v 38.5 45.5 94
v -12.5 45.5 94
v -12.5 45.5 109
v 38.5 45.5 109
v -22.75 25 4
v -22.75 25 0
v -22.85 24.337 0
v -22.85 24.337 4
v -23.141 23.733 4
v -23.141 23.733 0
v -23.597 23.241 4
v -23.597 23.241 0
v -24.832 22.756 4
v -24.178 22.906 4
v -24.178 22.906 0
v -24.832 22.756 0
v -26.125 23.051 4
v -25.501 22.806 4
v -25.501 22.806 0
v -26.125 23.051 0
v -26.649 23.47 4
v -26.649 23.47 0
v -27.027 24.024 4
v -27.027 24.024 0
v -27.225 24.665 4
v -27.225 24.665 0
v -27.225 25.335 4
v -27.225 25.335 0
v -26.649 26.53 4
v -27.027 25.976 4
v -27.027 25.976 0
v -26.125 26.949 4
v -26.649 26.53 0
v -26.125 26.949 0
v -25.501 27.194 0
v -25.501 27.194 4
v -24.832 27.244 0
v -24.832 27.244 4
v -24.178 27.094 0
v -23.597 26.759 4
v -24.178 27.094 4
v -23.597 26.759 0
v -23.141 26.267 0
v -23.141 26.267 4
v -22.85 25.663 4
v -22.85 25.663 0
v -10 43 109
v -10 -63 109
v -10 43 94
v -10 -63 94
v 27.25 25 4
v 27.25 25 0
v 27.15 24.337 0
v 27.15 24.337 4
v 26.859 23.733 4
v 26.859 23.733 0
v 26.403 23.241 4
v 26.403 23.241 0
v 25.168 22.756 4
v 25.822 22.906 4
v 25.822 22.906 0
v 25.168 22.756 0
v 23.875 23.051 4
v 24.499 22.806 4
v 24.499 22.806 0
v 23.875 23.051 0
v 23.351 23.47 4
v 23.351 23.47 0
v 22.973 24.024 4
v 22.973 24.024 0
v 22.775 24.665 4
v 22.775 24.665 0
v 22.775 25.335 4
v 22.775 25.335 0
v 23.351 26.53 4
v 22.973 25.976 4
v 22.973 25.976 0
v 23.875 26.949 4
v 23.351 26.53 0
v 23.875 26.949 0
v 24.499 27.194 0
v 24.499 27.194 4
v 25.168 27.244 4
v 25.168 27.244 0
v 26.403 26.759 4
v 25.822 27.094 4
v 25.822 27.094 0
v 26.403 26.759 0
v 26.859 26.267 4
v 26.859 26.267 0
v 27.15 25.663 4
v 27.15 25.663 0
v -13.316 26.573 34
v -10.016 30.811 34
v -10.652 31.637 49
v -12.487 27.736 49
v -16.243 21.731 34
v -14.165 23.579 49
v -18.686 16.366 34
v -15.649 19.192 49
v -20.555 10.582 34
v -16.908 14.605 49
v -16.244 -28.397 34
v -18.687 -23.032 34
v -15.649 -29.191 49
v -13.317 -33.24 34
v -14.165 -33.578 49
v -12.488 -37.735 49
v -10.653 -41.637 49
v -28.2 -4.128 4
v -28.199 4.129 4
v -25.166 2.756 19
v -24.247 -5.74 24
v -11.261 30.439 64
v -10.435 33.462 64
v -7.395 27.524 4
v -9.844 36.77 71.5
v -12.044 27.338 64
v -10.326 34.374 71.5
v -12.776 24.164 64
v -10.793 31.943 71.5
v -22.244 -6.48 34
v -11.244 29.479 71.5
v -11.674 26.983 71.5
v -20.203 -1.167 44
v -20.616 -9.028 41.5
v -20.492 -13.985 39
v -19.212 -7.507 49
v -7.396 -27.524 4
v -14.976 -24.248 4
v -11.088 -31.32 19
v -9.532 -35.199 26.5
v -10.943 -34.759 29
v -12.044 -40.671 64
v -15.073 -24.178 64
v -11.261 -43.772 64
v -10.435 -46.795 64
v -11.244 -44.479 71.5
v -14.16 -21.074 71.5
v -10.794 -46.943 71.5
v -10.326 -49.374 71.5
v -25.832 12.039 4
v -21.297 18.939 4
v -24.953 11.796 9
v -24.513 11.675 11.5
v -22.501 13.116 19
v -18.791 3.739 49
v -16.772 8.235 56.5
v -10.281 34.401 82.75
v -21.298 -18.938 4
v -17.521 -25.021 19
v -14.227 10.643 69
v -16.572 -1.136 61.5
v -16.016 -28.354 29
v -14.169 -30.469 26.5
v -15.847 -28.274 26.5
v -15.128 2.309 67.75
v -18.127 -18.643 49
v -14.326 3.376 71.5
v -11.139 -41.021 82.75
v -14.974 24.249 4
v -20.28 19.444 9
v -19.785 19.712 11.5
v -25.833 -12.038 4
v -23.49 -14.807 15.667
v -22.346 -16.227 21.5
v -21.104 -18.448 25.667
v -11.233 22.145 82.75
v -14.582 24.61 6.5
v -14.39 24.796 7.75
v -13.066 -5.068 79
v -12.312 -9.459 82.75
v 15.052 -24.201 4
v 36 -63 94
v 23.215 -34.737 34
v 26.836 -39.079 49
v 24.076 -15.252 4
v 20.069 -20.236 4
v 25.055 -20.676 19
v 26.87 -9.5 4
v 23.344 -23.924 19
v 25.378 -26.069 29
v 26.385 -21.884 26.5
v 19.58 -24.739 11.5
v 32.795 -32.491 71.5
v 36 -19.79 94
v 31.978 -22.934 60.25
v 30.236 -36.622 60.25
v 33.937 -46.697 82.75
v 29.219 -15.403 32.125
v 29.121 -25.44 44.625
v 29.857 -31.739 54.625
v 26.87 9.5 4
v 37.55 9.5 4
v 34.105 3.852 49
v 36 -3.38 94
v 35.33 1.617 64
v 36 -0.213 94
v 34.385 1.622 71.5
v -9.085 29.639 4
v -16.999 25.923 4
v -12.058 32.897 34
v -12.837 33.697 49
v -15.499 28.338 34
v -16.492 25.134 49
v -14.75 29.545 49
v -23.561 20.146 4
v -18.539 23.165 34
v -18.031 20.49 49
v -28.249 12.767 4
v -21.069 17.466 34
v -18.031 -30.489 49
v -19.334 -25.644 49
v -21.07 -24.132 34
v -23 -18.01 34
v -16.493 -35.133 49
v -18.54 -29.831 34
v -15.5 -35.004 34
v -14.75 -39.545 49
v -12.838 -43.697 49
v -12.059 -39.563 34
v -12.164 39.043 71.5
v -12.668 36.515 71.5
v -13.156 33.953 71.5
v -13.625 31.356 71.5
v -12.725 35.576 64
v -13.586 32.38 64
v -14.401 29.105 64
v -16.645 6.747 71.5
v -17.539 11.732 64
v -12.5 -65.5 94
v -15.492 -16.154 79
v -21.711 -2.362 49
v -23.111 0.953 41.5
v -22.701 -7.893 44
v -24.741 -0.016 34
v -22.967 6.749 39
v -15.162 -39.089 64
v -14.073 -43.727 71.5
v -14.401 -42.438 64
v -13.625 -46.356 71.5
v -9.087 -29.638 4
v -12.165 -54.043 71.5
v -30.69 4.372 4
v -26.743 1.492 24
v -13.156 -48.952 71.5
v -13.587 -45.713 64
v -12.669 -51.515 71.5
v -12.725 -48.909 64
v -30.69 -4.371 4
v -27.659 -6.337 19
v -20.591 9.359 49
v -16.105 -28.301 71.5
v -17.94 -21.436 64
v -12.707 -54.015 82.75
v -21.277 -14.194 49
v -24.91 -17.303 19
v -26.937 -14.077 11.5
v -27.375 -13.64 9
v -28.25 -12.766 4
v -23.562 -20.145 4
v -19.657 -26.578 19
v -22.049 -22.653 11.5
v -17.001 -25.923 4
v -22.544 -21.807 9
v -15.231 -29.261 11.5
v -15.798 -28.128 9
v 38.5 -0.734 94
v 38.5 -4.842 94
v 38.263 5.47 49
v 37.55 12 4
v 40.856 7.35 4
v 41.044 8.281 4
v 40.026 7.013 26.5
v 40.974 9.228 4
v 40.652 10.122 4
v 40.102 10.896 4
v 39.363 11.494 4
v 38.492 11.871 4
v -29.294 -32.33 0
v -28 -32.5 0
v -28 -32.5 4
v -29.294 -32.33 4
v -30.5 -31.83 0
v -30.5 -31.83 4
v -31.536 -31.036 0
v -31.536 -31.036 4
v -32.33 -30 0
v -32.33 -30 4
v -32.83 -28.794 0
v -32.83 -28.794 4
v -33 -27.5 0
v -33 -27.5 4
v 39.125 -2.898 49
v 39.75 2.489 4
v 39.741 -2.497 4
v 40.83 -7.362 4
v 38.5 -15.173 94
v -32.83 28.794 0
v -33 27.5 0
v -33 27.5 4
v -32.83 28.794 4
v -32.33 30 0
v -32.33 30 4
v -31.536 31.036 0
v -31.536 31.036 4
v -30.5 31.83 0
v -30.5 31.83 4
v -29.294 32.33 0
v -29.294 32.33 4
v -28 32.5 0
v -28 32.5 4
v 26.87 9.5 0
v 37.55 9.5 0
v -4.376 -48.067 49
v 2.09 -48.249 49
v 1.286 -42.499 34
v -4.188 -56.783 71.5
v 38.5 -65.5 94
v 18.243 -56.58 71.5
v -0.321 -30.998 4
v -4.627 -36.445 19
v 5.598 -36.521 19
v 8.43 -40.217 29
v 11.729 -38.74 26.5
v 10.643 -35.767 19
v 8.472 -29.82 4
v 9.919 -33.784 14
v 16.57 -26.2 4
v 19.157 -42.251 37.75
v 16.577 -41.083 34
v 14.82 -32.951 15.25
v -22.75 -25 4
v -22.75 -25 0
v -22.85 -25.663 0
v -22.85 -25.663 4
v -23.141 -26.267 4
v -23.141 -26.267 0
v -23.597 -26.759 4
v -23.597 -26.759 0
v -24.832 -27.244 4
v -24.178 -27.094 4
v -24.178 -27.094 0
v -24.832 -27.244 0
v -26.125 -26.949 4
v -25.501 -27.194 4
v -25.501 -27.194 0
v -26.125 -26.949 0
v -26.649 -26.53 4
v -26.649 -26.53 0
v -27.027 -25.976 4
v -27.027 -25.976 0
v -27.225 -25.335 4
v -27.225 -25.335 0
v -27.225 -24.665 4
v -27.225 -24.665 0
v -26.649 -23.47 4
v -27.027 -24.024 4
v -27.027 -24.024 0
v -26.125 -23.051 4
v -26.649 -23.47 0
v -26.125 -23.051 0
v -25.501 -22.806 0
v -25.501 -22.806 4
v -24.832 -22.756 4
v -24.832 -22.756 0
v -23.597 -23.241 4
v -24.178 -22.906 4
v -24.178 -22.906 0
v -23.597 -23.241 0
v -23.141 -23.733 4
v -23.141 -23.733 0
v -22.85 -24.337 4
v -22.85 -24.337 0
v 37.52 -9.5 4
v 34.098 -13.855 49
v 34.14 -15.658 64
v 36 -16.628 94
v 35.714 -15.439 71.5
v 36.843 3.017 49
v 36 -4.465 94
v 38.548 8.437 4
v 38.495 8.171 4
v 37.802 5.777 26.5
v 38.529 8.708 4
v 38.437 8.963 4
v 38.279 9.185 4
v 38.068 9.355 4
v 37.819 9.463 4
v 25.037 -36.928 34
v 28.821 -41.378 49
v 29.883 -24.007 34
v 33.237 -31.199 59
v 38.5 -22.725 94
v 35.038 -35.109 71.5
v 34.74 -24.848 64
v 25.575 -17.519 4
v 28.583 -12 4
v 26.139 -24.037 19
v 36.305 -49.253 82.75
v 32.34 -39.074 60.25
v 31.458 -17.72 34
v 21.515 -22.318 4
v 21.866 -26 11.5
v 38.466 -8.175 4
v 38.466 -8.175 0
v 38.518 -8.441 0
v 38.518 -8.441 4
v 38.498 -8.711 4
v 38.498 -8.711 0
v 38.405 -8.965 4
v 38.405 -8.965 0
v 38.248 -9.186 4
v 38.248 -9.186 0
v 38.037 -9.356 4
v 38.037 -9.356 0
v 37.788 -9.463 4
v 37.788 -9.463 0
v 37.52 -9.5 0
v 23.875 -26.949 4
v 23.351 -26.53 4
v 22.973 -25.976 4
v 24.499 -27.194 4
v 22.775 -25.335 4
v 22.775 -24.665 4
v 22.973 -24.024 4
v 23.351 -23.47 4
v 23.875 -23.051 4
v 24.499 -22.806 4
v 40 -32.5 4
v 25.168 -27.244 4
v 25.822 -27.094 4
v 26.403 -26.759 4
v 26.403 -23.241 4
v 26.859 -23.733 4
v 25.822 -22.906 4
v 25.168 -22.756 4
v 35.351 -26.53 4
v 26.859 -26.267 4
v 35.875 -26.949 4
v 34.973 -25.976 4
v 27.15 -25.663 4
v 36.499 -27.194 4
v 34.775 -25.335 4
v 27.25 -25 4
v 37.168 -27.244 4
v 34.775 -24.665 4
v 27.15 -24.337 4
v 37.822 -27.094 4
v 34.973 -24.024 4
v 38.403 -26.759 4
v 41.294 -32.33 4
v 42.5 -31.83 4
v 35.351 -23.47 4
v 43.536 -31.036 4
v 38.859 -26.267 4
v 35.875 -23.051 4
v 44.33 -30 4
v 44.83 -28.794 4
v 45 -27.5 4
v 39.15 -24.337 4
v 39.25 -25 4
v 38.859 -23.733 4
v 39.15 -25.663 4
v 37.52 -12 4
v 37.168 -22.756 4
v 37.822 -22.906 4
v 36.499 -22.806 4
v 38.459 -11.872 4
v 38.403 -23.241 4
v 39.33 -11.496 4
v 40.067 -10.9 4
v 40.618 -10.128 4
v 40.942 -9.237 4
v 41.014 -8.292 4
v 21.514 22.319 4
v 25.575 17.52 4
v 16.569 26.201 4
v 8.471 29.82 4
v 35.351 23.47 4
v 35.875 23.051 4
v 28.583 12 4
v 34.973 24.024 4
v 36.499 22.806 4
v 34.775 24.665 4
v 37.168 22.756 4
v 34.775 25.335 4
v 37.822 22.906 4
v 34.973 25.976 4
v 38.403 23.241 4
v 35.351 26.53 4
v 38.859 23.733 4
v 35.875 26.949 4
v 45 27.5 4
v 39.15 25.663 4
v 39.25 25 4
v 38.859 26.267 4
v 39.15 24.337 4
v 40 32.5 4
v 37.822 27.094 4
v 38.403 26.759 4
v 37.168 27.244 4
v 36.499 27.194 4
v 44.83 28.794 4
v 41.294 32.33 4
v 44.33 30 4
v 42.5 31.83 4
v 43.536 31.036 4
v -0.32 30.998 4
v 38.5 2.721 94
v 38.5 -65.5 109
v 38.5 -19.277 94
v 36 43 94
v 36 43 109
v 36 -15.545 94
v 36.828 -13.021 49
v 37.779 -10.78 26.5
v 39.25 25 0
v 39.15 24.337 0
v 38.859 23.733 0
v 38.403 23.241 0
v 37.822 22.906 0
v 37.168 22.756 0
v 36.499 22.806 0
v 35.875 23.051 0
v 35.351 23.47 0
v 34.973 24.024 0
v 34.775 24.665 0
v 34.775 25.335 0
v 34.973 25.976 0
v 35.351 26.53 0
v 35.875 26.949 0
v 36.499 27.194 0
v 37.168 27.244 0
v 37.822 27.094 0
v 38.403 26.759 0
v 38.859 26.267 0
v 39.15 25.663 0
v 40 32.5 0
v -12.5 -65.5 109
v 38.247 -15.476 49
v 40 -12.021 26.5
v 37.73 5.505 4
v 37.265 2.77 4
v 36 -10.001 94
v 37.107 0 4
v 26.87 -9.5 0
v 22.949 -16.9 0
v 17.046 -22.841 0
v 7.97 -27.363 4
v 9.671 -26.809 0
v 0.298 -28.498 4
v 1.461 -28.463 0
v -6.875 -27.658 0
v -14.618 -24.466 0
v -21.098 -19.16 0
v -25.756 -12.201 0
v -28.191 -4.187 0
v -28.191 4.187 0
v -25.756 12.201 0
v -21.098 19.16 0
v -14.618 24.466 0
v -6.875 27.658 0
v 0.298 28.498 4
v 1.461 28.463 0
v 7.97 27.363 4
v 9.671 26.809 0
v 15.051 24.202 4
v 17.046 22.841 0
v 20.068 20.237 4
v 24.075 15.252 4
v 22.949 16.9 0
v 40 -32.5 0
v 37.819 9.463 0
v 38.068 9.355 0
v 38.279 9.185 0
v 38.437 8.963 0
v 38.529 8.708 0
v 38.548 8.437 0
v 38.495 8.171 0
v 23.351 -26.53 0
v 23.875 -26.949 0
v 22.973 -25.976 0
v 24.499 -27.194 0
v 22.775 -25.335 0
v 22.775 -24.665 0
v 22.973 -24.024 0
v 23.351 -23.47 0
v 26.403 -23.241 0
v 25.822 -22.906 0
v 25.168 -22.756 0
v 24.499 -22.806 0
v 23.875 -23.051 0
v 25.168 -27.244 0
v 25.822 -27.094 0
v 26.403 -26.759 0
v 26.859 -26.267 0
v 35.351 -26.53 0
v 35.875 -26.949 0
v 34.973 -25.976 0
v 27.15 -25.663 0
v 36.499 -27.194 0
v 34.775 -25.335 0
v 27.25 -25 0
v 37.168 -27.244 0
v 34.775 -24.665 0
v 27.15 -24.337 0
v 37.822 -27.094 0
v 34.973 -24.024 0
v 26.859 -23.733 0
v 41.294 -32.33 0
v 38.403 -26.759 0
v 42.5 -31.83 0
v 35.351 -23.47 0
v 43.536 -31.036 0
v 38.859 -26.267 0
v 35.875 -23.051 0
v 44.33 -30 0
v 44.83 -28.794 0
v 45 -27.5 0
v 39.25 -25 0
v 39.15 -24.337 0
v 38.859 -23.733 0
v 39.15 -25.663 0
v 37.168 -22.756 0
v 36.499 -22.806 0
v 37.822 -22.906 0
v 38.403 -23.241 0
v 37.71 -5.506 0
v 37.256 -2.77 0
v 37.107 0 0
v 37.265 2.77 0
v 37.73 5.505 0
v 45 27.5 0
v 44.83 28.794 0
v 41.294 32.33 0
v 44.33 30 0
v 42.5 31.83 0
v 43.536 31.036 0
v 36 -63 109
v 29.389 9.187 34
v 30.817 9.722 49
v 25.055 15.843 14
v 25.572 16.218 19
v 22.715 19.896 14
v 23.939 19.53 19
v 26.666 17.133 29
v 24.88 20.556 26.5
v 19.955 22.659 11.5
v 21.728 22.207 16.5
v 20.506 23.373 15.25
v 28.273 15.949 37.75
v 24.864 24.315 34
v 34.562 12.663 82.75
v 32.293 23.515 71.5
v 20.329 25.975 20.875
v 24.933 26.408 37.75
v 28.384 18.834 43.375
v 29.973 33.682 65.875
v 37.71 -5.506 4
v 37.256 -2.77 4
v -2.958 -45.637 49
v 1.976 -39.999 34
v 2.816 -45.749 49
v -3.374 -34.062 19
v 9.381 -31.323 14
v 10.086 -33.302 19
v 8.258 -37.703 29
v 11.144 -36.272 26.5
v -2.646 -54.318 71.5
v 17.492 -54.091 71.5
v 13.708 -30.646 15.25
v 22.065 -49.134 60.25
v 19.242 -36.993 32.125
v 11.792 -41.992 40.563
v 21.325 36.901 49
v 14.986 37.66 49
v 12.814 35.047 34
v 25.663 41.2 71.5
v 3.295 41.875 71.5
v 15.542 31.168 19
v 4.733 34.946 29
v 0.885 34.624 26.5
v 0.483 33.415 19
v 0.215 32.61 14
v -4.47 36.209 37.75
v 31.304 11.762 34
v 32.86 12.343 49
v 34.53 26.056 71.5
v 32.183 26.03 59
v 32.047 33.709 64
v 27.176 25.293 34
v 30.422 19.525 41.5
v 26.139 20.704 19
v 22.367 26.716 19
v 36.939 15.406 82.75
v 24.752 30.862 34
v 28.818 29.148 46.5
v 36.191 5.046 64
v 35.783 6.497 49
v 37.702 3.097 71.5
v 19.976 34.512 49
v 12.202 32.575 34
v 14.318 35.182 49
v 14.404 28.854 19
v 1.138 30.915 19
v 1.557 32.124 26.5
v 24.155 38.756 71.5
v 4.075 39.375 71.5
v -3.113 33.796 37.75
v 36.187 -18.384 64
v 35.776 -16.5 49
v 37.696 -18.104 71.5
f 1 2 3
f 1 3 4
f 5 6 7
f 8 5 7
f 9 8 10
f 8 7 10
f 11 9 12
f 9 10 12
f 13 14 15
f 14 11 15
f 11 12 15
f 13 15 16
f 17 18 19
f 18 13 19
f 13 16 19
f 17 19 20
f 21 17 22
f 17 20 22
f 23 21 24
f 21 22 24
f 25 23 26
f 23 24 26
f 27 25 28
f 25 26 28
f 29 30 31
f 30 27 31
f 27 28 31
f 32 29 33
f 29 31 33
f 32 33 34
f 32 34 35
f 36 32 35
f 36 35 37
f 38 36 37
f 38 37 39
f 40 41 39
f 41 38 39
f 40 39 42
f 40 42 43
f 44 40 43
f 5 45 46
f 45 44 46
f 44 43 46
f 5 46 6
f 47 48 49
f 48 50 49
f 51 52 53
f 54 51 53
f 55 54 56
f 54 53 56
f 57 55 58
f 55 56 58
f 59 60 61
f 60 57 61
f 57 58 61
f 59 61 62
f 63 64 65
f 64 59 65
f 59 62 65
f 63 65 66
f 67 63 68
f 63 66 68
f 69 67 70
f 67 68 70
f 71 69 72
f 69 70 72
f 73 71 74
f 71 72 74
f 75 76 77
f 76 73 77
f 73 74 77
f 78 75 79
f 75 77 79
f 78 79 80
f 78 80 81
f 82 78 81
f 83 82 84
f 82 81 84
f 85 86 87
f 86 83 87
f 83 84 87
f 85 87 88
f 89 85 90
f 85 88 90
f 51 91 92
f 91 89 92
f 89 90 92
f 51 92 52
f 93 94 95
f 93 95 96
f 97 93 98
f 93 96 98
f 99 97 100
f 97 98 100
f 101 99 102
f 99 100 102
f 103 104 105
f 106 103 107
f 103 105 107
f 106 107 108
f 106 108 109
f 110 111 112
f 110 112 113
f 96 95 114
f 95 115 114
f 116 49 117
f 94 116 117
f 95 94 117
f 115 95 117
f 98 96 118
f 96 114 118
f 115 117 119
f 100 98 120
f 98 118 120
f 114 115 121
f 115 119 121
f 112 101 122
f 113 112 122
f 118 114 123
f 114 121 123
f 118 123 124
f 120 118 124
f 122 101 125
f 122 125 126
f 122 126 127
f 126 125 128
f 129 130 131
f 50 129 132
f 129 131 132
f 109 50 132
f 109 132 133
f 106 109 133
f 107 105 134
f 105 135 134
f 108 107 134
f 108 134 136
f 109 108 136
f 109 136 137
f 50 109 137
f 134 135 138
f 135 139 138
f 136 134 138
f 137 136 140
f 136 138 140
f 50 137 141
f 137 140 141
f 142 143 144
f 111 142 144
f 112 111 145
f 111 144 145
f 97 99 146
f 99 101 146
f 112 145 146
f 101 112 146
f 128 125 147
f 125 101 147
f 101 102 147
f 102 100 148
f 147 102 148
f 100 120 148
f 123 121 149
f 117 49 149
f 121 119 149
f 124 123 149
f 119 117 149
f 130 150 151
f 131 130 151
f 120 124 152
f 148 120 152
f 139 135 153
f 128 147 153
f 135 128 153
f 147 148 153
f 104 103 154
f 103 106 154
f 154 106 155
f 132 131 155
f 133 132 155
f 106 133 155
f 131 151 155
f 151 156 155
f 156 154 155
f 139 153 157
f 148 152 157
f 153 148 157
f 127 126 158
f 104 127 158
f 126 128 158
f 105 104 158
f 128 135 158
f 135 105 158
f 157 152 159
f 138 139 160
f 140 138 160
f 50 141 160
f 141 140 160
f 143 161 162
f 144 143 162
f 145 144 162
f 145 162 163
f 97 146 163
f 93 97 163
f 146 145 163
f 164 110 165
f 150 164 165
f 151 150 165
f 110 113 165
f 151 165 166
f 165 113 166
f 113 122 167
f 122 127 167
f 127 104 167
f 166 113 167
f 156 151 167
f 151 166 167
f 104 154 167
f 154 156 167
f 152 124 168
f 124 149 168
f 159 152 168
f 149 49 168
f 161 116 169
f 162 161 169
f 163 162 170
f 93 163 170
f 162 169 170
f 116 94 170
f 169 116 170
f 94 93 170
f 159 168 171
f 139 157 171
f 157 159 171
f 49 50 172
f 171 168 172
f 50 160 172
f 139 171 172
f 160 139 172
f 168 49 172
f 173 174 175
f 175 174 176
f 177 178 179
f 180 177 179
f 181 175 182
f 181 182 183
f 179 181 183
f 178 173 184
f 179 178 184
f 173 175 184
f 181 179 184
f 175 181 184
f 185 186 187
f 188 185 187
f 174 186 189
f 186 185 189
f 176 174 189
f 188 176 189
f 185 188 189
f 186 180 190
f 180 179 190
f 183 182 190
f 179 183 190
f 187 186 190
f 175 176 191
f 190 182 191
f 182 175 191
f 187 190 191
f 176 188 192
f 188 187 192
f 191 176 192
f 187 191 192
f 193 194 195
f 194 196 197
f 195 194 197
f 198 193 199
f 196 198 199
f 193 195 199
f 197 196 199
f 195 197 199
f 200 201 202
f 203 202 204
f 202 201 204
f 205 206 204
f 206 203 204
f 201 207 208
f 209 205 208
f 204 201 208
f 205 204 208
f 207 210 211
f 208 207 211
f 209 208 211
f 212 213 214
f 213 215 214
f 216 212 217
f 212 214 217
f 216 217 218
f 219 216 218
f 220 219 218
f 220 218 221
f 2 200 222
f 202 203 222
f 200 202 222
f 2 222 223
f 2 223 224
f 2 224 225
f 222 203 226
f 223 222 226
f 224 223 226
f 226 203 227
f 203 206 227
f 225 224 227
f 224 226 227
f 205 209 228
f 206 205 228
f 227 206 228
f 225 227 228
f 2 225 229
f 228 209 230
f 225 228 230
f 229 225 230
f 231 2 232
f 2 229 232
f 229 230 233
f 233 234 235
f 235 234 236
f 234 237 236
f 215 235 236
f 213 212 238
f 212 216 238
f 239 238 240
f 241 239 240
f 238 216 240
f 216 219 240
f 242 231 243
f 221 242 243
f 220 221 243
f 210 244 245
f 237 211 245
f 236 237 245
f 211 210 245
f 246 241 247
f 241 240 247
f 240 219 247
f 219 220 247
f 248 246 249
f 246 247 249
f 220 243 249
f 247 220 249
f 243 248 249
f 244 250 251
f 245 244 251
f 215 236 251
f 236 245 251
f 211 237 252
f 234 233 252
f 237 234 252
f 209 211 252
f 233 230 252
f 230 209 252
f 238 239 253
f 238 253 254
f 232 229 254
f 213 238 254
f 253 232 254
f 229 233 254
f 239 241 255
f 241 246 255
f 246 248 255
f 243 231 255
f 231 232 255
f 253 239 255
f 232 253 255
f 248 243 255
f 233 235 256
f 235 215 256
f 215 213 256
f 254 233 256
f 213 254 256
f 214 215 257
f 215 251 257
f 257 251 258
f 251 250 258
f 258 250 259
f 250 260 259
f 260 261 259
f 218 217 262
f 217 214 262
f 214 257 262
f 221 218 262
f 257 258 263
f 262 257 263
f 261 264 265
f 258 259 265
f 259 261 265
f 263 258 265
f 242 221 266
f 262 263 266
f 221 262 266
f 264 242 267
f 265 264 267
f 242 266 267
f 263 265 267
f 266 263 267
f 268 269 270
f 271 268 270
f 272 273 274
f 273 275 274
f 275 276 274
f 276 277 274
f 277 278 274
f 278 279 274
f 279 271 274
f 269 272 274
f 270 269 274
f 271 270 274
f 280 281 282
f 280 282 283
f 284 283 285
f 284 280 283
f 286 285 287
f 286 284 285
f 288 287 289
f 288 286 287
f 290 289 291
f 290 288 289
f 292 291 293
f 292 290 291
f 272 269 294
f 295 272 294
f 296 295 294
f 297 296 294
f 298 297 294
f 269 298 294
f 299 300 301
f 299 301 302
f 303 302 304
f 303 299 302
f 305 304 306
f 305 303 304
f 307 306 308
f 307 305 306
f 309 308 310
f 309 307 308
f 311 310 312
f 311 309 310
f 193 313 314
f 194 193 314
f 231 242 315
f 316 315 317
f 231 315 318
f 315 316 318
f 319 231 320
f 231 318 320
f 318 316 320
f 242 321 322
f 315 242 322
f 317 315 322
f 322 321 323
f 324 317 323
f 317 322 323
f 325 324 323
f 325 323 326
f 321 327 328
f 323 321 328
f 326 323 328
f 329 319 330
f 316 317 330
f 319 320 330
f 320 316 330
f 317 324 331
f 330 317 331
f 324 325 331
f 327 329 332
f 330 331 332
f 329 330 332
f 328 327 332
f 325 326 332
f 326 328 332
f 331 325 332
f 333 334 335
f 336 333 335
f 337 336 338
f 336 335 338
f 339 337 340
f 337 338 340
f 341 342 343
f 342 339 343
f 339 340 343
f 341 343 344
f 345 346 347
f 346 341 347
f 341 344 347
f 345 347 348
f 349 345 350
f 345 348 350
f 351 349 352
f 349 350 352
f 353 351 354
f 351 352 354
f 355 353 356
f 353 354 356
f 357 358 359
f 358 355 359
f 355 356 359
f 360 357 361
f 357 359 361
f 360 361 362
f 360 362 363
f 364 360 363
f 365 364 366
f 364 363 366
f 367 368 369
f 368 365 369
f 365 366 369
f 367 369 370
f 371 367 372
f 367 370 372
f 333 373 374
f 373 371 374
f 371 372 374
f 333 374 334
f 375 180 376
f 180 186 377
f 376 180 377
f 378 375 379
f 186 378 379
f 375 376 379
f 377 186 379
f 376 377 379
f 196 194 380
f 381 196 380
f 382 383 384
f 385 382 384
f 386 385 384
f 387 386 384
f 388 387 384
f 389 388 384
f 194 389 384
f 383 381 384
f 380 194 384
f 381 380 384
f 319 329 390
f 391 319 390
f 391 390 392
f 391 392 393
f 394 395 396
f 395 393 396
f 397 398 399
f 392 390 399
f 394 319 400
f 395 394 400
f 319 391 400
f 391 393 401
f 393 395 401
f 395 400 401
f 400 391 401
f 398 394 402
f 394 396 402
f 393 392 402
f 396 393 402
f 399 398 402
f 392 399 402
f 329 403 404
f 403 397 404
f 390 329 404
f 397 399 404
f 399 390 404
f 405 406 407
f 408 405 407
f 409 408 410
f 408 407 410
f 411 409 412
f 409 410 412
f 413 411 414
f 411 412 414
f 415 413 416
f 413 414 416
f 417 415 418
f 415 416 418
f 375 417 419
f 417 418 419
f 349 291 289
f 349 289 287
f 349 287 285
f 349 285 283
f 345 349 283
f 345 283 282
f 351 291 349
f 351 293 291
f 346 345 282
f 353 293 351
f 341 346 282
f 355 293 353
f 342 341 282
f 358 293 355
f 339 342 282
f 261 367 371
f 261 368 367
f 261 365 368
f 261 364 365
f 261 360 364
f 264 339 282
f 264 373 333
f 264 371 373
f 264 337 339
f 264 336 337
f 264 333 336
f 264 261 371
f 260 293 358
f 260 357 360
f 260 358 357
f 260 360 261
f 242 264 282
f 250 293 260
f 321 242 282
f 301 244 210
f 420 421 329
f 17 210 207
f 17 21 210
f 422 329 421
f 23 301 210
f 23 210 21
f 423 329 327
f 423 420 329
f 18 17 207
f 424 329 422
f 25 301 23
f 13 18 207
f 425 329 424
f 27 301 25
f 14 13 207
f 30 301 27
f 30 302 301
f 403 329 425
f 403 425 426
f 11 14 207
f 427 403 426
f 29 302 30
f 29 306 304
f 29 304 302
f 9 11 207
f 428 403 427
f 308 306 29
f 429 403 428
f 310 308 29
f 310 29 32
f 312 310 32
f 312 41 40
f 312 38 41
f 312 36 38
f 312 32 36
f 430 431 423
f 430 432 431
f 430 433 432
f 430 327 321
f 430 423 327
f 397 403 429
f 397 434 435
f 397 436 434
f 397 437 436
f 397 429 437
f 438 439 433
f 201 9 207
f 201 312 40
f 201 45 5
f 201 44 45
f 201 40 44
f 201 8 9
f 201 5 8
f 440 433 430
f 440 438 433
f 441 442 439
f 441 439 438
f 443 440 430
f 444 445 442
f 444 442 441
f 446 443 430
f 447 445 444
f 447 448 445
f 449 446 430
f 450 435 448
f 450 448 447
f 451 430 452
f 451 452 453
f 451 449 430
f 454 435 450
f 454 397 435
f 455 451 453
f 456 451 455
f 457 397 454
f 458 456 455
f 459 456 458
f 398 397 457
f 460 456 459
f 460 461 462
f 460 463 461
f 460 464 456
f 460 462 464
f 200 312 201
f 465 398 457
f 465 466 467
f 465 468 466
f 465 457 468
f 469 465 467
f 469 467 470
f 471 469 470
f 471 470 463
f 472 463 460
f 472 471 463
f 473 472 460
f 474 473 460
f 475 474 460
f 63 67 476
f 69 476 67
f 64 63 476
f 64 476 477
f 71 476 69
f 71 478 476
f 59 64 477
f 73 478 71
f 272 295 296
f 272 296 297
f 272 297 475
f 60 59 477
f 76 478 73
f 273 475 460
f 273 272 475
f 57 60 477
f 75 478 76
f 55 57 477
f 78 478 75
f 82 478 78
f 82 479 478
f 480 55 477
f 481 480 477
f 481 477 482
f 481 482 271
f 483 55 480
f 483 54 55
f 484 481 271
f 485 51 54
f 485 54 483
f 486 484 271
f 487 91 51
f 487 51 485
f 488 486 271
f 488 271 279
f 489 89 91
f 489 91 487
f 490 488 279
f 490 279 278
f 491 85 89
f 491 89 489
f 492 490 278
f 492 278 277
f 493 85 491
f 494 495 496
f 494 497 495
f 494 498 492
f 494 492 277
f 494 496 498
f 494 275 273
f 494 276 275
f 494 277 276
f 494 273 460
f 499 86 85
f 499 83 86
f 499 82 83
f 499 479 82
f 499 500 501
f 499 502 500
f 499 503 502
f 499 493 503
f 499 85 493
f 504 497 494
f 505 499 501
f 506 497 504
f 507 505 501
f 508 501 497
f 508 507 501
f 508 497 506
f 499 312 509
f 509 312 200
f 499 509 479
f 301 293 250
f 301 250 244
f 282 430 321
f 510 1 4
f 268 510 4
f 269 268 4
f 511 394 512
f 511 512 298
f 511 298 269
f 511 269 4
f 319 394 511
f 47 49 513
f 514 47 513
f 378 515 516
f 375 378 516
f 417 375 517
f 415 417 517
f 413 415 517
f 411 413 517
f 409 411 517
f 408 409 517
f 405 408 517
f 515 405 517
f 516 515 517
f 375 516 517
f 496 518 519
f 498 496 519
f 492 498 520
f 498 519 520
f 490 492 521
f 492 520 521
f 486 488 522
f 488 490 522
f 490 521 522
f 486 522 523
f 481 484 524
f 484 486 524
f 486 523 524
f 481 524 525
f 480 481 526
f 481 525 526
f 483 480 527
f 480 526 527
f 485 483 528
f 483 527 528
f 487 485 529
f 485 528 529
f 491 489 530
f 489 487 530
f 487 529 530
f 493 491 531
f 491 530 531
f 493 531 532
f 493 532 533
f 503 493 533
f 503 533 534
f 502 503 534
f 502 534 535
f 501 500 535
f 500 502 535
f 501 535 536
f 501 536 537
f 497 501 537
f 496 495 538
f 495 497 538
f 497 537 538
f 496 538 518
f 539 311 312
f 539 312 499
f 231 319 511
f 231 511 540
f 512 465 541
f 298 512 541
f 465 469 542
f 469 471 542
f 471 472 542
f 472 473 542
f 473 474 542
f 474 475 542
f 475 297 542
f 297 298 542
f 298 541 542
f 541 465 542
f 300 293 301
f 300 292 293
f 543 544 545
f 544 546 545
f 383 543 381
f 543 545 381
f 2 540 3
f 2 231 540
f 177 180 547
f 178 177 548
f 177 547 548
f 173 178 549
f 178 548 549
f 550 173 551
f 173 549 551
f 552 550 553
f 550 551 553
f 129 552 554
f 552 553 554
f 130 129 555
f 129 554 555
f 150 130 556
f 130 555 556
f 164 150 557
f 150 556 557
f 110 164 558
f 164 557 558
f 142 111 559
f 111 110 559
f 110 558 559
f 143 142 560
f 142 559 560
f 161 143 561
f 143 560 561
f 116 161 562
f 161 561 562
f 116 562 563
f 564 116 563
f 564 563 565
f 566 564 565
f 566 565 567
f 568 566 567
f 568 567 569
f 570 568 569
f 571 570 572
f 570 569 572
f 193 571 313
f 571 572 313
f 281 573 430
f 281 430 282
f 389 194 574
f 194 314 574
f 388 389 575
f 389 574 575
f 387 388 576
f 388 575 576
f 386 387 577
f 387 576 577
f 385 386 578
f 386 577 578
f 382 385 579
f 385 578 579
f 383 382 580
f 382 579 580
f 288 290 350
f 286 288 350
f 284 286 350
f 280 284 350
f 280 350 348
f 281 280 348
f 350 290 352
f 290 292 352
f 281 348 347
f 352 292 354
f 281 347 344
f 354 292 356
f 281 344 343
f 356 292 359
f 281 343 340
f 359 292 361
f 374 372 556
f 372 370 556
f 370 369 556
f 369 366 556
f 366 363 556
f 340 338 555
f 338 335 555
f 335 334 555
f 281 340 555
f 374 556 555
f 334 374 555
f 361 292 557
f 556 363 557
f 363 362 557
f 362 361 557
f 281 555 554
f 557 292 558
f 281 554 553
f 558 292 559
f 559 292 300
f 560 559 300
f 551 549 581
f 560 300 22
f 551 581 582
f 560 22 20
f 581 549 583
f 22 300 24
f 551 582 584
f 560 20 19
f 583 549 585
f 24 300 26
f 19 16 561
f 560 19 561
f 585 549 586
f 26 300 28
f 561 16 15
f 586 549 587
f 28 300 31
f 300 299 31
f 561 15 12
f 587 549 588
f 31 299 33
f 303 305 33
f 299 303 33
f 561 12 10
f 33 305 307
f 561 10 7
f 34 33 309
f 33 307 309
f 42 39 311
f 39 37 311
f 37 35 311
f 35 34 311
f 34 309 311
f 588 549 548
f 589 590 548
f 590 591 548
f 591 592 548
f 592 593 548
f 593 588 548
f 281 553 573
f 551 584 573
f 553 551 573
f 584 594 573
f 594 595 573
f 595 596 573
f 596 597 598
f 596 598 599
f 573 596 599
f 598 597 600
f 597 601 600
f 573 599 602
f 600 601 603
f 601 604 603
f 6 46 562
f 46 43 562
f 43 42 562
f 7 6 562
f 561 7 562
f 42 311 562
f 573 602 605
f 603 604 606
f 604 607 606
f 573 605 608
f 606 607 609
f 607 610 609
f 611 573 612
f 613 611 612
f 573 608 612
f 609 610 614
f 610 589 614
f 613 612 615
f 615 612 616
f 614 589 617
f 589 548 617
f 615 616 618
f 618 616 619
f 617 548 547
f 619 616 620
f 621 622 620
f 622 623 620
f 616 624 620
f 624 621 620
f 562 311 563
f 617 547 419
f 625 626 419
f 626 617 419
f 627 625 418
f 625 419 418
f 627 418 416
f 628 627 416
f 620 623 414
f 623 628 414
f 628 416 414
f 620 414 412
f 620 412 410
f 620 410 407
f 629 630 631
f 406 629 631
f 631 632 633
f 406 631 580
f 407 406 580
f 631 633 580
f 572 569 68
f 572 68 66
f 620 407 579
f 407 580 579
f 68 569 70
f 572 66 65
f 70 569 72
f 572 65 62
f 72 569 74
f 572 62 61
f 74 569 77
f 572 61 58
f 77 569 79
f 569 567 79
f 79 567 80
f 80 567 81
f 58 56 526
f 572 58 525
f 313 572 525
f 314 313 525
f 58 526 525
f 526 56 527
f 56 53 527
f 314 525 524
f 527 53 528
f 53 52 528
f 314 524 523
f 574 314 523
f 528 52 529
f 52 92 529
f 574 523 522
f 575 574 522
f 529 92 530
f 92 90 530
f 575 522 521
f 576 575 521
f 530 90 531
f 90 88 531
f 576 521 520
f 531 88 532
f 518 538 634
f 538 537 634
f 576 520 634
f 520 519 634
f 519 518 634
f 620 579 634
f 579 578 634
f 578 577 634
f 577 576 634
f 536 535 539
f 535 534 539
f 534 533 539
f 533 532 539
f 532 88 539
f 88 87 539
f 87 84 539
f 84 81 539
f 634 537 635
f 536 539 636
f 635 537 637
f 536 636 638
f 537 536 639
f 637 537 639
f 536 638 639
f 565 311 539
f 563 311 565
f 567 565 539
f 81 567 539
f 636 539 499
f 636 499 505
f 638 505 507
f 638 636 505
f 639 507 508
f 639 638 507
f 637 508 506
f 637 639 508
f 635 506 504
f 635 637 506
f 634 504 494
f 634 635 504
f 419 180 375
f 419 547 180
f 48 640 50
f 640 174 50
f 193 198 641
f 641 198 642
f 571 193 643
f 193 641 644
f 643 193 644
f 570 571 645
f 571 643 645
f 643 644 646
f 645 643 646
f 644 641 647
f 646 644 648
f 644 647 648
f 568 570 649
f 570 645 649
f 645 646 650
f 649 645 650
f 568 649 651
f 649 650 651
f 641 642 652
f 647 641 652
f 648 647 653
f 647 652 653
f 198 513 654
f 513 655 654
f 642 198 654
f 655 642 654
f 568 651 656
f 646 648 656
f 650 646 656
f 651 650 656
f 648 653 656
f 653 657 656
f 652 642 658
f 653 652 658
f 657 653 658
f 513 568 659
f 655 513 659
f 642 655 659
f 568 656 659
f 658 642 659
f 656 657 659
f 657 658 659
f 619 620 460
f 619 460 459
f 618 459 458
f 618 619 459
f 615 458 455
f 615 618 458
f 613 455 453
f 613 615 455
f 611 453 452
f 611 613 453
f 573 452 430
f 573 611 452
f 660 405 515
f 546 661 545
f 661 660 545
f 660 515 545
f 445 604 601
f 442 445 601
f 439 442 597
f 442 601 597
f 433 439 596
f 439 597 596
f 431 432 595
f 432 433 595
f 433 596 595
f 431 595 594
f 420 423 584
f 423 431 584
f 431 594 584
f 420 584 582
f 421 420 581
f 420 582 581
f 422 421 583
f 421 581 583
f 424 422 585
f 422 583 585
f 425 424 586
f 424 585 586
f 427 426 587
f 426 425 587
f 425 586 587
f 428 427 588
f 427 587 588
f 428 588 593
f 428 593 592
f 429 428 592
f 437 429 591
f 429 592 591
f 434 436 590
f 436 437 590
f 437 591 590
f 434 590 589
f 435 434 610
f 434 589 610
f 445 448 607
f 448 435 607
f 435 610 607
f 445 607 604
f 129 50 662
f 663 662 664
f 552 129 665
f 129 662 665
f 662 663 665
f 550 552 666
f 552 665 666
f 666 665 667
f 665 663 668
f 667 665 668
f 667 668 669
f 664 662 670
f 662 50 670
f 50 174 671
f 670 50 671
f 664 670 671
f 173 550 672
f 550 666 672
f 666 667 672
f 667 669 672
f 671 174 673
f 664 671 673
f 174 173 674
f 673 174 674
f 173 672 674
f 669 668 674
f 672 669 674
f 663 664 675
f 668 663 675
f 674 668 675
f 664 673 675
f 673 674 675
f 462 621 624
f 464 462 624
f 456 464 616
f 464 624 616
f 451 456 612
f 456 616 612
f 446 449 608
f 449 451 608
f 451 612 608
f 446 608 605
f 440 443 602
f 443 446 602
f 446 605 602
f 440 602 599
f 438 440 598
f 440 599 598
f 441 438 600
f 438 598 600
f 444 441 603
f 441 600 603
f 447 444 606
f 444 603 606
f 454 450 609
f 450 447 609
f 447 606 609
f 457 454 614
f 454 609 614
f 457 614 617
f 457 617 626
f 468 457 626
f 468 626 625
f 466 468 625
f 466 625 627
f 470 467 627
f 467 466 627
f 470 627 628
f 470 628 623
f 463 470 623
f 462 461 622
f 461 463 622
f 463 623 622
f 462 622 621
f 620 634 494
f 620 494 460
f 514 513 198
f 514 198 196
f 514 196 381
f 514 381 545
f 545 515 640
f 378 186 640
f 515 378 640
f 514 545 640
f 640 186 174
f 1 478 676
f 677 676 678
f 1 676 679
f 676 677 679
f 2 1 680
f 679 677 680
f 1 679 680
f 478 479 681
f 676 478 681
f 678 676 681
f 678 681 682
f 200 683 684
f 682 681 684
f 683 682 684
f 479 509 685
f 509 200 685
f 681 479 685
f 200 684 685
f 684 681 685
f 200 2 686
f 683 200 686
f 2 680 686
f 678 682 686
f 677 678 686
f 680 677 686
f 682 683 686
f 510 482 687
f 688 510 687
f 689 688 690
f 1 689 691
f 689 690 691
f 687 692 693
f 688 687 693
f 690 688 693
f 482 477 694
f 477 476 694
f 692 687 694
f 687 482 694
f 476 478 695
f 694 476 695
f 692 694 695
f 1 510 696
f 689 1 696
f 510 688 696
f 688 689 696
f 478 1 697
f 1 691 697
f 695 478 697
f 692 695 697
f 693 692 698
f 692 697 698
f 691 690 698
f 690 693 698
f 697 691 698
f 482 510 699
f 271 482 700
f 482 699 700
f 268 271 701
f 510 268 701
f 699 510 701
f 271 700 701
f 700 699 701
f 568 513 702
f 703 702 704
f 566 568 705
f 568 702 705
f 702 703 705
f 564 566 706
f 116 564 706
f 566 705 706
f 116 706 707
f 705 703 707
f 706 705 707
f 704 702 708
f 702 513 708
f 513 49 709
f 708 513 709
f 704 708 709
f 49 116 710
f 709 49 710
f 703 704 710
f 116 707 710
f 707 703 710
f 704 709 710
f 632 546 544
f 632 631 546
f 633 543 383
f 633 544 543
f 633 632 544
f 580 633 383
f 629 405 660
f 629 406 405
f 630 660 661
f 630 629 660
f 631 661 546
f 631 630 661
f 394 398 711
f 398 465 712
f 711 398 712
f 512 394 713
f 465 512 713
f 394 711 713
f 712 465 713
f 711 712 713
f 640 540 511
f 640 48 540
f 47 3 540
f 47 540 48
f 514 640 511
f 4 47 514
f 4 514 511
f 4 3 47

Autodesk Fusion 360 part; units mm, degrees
sketch "Sketch1" plane through (0, 0, 0) normal (0, 0, 1) x (1, 0, 0)
  line L0 (-35, 0) -> (100, 0) construction
  line L1 (-40, 25) -> (100, 25) construction
  line L2 (-40, -25) -> (100, -25) construction
  line L3 (-25, 35) -> (-25, -35) construction
  line L4 (25, 35) -> (25, -35) construction
  line L5 (37, 40) -> (37, -35) construction
  line L6 (87, 40) -> (87, -35) construction
  line L7 (0, 34.11) -> (0, -35.89) construction
  line L8 (62, 39.5481) -> (62, -30.4569) construction
  circle A0 centre (-25, 25) radius 2.25
  circle A1 centre (-25, -25) radius 2.25
  circle A2 centre (25, 25) radius 2.25
  circle A3 centre (25, -25) radius 2.25
  circle A4 centre (37, -25) radius 2.25
  circle A5 centre (37, 25) radius 2.25
  circle A6 centre (62, 0) radius 28.5 construction
  arc A7 (26.8701, 9.5) -> (26.8701, -9.5) centre (0, 0) ccw
  arc A8 (28.5, 0) -> (26.8701, 9.5) centre (0, 0) ccw construction
  arc A9 (26.8701, -9.5) -> (28.5, 0) centre (0, 0) ccw construction
  line L9 (22.9687, -9.5) -> (25, -9.5) construction
  line L10 (23, 9.5) -> (25, 9.5) construction
  line L11 (-28, 32.5) -> (40, 32.5)
  line L12 (45, 27.5) -> (45, -27.5)
  line L13 (40, -32.5) -> (-28, -32.5)
  line L14 (-33, -27.5) -> (-33, 27.5)
  arc A10 (40, -32.5) -> (45, -27.5) centre (40, -27.5) ccw
  arc A11 (-33, -27.5) -> (-28, -32.5) centre (-28, -27.5) ccw
  arc A12 (-28, 32.5) -> (-33, 27.5) centre (-28, 27.5) ccw
  arc A13 (45, 27.5) -> (40, 32.5) centre (40, 27.5) ccw
  line L15 (23, 9.5) -> (37.5505, 9.5)
  line L16 (22.9687, -9.5) -> (37.52, -9.5)
  arc A14 (38.9638, -9.5) -> (39, 9.5) centre (62.1065, -0.044) ccw construction
  arc A15 (38.4949, 8.1714) -> (37.1066, 0) centre (62.1065, -0.044) ccw
  arc A16 (37.1066, 0) -> (38.4657, -8.1748) centre (62.1065, -0.044) ccw
  arc A17 (38.4949, 8.1714) -> (37.5505, 9.5) centre (37.5505, 8.5) ccw
  arc A18 (37.52, -9.5) -> (38.4657, -8.1748) centre (37.52, -8.5) ccw
  dimension "d1" = 50
  dimension "d2" = 50
  dimension "d3" = 50
  dimension "d6" = 62
  dimension "d10" = 4.5
  dimension "d11" = 4.5
  dimension "d12" = 4.5
  dimension "d13" = 4.5
  dimension "d14" = 4.5
  dimension "d15" = 4.5
  dimension "d16" = 57
  dimension "d18" = 57
  dimension "d20" = 19
  dimension "d21" = 65
  dimension "d23" = 8
  dimension "d24" = 8
  dimension "d25" = 5
  dimension "d26" = 5
  dimension "d27" = 5
  dimension "d28" = 5
  dimension "d49" = 50
  dimension "d50" = 1
  dimension "d51" = 1
extrude "Extrude4" add sketch "Sketch1" along normal blind 4 makes body 1
sketch "Sketch6" plane through (0, 0, 4) normal (0, 0, 1) x (-1, 0, 0)
  circle A0 centre (-37, 25) radius 2.25
  circle A1 centre (25, -25) radius 2.25
  circle A2 centre (-25, -25) radius 2.25
  circle A3 centre (-25, 25) radius 2.25
  circle A4 centre (25, 25) radius 2.25
  circle A5 centre (-37, -25) radius 2.25
  arc A6 (-26.8701, -9.5) -> (-26.8701, 9.5) centre (0, 0) ccw
  line L0 (-26.8701, -9.5) -> (-37.5505, -9.5)
  arc A7 (-38.4949, -8.1714) -> (-37.5505, -9.5) centre (-37.5505, -8.5) ccw
  arc A8 (-38.4949, -8.1714) -> (-38.4657, 8.1748) centre (-62.1065, 0.044) ccw
  arc A9 (-37.52, 9.5) -> (-38.4657, 8.1748) centre (-37.52, 8.5) ccw
  line L1 (-37.52, 9.5) -> (-26.8701, 9.5)
  arc A10 (-40, 32.5) -> (-45, 27.5) centre (-40, 27.5) ccw
  line L2 (-45, 27.5) -> (-45, -27.5)
  arc A11 (-45, -27.5) -> (-40, -32.5) centre (-40, -27.5) ccw
  line L3 (-40, -32.5) -> (28, -32.5)
  arc A12 (28, -32.5) -> (33, -27.5) centre (28, -27.5) ccw
  line L4 (33, -27.5) -> (33, 27.5)
  arc A13 (33, 27.5) -> (28, 32.5) centre (28, 27.5) ccw
  line L5 (28, 32.5) -> (-40, 32.5)
  line L6 (-37.52, 12) -> (-28.5832, 12)
  arc A14 (-28.5832, -12) -> (-28.5832, 12) centre (0, 0) ccw
  line L7 (-28.5832, -12) -> (-37.5505, -12)
  arc A15 (-40.8561, -7.3498) -> (-37.5505, -12) centre (-37.5505, -8.5) ccw
  arc A16 (-40.8561, -7.3498) -> (-40.8298, 7.3617) centre (-62.1065, 0.044) ccw
  arc A17 (-37.52, 12) -> (-40.8298, 7.3617) centre (-37.52, 8.5) ccw
  dimension "d54" = 2.5
ref_plane "WorkPlane1" through (0, 0, 94) normal (0, 0, 1) x (1, 0, 0)
sketch "Sketch2" plane through (0, 0, 94) normal (0, 0, 1) x (1, 0, 0)
  line L0 (0, 45) -> (0, -45) construction
  line L1 (-40, 0) -> (55, 0) construction
  line L2 (13, 45) -> (13, -45) construction
  line L3 (-40, -10) -> (55, -10) construction
  line L4 (36, -63) -> (-5.5, -63)
  line L5 (-10, -48) -> (-10, 28)
  line L6 (-5.5, 43) -> (36, 43)
  line L7 (36, 43) -> (36, -63)
  line L8 (36, -63) -> (-10, 43) construction
  line L9 (-10, -63) -> (36, 43) construction
  line L10 (-10, 28) -> (-10, 43)
  line L11 (-10, 43) -> (-5.5, 43)
  line L12 (-10, -63) -> (-10, -48)
  line L13 (-5.5, -63) -> (-10, -63)
  line L14 (-5.5, -65.5) -> (-12.5, -65.5)
  line L15 (-12.5, -65.5) -> (-12.5, -48)
  line L16 (-12.5, -48) -> (-12.5, 28)
  line L17 (-12.5, 28) -> (-12.5, 45.5)
  line L18 (-12.5, 45.5) -> (-5.5, 45.5)
  line L19 (-5.5, 45.5) -> (38.5, 45.5)
  line L20 (38.5, 45.5) -> (38.5, -65.5)
  line L21 (38.5, -65.5) -> (-5.5, -65.5)
  point P0 (13, -10)
  dimension "d34" = 13
  dimension "d35" = 10
  dimension "d36" = 46
  dimension "d37" = 106
  dimension "d46" = -2.5
extrude "Extrude3" add sketch "Sketch2" along normal blind 15 separate body makes body 2
loft "Loft5" add profiles "Sketch2", "Sketch6" section 1 contours L4 L5 L6 L7 L10 L11 L12 L13 | L14 L15 L16 L17 L18 L19 L20 L21 section 2 contours L6 A14 L7 A15 A16 A17 bodies 1 2
loft "Loft6" cut section 1 face at (-2.0683, -8.0442, 4) section 2 face at (20.6667, 7.6667, 94) on bodies 1 bodies 1
